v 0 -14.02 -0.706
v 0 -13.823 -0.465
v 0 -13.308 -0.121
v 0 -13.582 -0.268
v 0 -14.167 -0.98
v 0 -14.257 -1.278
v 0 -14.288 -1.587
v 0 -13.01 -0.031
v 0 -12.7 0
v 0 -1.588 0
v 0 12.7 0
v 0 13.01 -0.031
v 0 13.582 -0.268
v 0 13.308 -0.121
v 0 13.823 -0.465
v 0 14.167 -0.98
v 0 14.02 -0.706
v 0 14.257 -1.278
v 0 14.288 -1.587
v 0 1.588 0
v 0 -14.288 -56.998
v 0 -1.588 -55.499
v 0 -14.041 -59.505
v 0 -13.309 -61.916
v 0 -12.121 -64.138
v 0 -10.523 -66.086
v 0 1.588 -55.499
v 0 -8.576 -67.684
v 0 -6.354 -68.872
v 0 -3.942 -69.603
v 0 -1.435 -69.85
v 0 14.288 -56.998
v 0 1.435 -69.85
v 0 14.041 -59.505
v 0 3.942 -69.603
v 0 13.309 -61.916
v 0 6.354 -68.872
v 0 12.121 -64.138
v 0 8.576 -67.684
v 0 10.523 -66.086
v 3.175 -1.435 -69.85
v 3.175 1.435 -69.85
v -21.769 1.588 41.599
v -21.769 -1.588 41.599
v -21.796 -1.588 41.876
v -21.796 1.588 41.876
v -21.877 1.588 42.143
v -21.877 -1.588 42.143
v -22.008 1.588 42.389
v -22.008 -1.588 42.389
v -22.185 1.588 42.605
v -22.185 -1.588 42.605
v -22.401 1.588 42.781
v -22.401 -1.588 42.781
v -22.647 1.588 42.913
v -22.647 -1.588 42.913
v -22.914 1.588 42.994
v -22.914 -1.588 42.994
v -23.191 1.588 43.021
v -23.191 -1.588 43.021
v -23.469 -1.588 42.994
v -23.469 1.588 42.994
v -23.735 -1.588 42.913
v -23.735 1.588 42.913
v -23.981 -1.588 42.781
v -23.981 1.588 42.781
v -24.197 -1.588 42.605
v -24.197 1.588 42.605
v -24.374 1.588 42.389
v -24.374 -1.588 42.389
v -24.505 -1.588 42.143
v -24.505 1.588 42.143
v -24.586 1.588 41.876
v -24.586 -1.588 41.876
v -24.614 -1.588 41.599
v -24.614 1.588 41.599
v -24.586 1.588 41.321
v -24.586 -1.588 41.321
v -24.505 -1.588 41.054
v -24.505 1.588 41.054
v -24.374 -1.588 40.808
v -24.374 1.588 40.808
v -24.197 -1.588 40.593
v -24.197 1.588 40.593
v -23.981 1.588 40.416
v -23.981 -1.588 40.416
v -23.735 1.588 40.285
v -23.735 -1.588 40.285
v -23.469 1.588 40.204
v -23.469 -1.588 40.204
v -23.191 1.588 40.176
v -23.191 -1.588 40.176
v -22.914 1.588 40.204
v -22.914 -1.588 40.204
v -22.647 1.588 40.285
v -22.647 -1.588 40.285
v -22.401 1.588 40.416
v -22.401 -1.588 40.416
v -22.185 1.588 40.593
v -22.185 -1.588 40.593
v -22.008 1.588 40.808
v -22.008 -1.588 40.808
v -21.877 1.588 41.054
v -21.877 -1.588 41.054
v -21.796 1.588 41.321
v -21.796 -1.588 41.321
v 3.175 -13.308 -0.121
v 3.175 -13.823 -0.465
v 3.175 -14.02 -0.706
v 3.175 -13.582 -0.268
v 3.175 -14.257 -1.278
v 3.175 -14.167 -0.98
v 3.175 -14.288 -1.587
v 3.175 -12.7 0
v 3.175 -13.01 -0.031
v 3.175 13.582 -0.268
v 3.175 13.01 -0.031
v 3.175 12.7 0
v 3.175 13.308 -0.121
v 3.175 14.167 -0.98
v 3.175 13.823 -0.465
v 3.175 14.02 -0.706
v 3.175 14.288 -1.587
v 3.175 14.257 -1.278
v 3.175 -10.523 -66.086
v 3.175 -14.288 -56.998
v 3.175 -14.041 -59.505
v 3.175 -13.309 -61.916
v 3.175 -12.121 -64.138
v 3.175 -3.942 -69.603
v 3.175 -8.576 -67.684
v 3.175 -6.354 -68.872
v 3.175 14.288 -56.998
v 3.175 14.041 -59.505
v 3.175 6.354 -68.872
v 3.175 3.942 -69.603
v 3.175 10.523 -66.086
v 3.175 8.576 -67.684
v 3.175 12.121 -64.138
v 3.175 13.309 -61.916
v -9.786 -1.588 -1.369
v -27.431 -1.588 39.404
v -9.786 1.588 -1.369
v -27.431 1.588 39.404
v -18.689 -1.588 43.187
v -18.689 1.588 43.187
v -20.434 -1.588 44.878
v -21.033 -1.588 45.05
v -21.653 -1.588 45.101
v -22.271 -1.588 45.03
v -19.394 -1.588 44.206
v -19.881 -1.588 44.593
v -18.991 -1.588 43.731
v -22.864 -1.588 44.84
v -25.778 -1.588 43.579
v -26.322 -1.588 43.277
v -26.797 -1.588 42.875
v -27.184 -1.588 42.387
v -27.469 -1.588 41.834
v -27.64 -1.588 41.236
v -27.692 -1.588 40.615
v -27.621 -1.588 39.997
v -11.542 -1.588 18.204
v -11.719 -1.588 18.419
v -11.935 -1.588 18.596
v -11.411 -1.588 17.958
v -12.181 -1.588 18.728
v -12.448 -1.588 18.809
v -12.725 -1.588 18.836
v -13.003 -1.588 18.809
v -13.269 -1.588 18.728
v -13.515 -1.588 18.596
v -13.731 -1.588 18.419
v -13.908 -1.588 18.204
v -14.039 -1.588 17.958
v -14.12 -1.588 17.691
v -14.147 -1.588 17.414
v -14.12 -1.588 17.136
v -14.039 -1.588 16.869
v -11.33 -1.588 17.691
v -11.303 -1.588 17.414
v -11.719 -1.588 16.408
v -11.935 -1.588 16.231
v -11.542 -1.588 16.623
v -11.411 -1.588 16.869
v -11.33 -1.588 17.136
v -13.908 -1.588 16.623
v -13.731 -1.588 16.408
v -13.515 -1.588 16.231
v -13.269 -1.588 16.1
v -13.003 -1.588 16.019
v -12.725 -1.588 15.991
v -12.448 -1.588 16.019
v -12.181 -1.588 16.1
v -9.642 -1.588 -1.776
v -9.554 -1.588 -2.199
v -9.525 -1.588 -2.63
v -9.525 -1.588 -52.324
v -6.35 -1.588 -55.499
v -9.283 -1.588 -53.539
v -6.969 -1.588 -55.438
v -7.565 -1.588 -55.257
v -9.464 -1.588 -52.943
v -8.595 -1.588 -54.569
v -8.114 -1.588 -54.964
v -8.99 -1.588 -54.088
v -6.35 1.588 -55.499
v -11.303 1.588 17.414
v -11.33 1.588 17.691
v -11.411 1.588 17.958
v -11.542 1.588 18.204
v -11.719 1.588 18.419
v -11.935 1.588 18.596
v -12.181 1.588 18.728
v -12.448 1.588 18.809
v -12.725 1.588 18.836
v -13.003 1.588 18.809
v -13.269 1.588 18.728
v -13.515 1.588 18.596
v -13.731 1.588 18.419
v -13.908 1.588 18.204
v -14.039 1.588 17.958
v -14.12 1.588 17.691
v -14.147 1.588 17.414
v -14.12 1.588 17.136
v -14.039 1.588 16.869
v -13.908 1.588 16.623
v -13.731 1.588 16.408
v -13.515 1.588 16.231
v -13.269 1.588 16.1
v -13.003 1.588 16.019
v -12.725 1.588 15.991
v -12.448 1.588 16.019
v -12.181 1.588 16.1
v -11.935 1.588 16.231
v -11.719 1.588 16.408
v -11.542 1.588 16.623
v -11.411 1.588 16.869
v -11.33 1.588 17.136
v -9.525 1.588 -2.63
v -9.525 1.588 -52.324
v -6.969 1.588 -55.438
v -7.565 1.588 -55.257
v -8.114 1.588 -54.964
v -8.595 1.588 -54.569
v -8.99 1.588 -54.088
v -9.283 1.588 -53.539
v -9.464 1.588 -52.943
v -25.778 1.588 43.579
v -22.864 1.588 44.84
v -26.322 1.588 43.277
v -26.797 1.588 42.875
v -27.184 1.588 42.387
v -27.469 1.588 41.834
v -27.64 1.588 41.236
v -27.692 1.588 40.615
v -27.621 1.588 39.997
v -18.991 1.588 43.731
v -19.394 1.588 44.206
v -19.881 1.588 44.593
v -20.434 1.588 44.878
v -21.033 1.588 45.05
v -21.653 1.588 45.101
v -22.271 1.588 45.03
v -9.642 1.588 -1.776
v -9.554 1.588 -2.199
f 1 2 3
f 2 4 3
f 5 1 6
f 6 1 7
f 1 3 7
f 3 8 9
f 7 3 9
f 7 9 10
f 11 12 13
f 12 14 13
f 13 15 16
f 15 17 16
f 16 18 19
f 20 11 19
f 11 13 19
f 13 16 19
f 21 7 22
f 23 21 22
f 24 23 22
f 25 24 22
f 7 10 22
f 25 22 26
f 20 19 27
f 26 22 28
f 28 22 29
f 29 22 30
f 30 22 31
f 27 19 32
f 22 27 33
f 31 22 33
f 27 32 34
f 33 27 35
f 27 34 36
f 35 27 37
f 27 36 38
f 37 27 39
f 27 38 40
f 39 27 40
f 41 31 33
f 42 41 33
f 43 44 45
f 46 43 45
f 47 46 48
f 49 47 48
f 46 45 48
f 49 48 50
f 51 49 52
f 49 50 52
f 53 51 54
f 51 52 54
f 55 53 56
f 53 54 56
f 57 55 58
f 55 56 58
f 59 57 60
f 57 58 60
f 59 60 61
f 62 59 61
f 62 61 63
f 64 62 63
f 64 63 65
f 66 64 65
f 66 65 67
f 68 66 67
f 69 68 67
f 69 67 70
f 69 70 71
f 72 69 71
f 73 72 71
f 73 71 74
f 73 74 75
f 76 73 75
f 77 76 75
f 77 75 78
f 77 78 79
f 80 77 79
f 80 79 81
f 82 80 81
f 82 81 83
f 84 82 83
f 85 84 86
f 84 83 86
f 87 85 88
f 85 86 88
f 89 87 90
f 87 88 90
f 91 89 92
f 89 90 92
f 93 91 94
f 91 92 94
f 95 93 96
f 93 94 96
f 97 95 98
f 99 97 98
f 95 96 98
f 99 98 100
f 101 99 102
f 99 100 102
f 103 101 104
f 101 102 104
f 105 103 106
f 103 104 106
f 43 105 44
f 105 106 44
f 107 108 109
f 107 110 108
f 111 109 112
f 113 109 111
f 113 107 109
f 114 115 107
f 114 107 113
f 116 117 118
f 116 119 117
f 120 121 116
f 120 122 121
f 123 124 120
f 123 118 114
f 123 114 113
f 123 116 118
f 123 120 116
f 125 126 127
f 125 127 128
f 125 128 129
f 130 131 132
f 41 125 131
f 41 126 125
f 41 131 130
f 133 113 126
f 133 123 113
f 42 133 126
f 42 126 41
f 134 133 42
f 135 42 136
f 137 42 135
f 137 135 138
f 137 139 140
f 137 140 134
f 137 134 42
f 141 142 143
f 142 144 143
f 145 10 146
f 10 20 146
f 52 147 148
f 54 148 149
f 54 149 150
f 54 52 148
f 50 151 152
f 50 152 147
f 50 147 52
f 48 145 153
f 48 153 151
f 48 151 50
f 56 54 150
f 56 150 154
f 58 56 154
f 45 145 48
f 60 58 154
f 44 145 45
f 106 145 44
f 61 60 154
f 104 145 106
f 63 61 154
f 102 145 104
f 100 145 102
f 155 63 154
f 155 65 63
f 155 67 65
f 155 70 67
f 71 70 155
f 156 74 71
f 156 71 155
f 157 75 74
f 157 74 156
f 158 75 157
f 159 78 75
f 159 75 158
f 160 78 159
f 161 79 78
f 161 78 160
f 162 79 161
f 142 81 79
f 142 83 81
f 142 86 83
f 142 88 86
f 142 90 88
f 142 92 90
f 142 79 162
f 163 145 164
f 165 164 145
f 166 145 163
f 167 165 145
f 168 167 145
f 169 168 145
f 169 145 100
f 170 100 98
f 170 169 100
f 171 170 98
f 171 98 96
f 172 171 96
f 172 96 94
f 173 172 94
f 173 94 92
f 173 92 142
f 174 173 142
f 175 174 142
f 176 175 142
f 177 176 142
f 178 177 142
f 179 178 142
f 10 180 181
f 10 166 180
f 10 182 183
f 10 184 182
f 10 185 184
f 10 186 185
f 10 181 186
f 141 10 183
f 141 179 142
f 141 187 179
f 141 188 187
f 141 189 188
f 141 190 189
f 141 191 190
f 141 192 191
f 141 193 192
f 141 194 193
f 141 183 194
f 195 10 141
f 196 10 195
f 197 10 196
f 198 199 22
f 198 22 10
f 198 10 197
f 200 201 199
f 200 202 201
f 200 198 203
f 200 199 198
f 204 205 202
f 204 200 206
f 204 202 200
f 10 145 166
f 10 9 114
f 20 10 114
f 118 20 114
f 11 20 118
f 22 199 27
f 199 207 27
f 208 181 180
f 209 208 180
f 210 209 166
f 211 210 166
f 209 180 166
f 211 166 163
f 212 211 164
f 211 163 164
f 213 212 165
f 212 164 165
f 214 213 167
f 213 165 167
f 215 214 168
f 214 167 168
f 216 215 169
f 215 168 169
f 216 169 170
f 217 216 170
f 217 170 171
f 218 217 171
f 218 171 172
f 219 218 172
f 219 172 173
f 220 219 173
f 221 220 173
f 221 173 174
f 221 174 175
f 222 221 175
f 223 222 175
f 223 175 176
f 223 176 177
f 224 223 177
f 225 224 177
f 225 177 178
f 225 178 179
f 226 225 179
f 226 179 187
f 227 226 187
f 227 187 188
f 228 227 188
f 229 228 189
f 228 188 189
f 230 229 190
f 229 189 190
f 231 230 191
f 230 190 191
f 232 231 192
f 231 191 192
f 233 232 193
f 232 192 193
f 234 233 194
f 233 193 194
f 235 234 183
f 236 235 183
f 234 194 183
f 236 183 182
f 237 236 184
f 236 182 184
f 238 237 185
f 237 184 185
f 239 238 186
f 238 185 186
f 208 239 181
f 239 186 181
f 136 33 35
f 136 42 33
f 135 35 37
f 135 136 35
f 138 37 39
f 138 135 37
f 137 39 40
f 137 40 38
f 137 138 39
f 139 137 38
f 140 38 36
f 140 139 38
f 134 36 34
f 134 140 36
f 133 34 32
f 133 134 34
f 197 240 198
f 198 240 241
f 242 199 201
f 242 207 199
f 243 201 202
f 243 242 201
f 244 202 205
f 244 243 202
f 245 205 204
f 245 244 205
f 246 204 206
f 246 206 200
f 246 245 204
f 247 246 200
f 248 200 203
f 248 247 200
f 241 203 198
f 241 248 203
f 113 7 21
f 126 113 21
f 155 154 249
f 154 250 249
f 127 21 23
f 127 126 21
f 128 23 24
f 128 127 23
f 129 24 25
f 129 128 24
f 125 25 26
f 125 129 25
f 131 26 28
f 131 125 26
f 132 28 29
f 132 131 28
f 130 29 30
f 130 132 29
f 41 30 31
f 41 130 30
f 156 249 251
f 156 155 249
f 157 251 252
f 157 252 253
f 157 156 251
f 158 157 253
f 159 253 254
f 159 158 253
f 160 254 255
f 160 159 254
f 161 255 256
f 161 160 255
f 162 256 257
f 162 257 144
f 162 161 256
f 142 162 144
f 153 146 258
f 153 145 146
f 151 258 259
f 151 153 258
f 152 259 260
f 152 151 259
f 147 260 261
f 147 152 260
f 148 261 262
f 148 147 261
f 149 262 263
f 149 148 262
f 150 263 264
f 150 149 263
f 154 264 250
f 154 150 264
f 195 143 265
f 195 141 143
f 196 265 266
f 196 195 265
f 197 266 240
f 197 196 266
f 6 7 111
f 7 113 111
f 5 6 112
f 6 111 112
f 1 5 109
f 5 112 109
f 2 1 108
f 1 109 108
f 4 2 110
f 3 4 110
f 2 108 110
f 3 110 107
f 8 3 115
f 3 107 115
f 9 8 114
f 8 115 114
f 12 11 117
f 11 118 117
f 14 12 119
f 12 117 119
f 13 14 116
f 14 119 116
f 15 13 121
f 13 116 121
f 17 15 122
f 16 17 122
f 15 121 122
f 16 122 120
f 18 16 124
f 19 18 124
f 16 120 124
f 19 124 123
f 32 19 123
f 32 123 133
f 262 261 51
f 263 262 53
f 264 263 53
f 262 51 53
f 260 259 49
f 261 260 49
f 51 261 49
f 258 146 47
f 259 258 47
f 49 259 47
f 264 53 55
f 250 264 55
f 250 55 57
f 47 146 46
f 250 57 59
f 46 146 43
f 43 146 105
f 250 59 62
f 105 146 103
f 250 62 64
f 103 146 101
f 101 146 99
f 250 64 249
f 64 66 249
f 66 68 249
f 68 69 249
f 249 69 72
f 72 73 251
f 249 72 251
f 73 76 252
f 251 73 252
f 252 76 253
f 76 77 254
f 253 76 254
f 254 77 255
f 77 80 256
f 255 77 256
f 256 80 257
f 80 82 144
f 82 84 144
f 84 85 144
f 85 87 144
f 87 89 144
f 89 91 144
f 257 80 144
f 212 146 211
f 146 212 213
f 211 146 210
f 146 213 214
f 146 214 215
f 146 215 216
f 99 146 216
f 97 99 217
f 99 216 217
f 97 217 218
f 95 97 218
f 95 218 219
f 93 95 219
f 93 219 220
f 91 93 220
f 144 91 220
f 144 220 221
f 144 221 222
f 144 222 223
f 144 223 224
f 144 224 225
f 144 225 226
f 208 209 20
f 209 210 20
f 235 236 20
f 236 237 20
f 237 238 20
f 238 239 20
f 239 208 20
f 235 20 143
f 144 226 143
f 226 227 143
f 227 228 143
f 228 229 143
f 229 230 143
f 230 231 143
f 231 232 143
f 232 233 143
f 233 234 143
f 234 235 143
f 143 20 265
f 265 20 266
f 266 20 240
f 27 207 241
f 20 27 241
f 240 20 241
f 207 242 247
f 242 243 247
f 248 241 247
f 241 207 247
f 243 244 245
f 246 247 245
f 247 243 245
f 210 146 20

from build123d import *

# Parameters (mm, degrees)
SKETCH1_W           = 69.85
SKETCH1_H           = 28.575
BOSS_EXTRUDE1_DEPTH = 3.175
FILLET1_R           = 12.8524
BOSS_EXTRUDE2_DEPTH = 1.5875
FILLET2_R           = 1.5875
FILLET3_R           = 3.175
HOLE1_D             = 2.8448
LPATTERN1_COUNT     = 2
LPATTERN1_PITCH     = 26.3525


with BuildPart() as part:
    # Sketch1 → Boss-Extrude1 (new body)
    with BuildSketch(Plane(origin=(0, 0, 0), x_dir=(0, 0, -1), z_dir=(1, 0, 0))):
        with Locations((34.925, 0)):
            Rectangle(SKETCH1_W, SKETCH1_H)
    extrude(amount=BOSS_EXTRUDE1_DEPTH)

    # Fillet1
    fillet1_edges = [part.edges().sort_by_distance(p)[0] for p in [
        (1.5875, 14.2875, -69.85),
        (1.5875, -14.2875, -69.85),
    ]]
    fillet(fillet1_edges, radius=FILLET1_R)

    # Sketch4 → Boss-Extrude2 (add, symmetric)
    with BuildSketch(Plane(origin=(0, 0, 0), x_dir=(1, 0, 0), z_dir=(0, 1, 0))):
        Polygon((0, 0), (-19.950179226, -46.101), (-28.691757819, -42.318087272), (-9.525, 1.972577598), (-9.525, 55.499), (0, 55.499), align=None)
    extrude(amount=BOSS_EXTRUDE2_DEPTH, both=True)

    # Fillet2
    fillet2_edges = [part.edges().sort_by_distance(p)[0] for p in [
        (1.5875, -14.2875, 0),
        (1.5875, 14.2875, 0),
    ]]
    fillet(fillet2_edges, radius=FILLET2_R)

    # Fillet3
    fillet3_edges = [part.edges().sort_by_distance(p)[0] for p in [
        (-9.525, 0, -55.499),
        (-9.525, 0, -1.972577598),
        (-19.950179226, 0, 46.101),
        (-28.691757819, 0, 42.318087272),
    ]]
    fillet(fillet3_edges, radius=FILLET3_R)

    # Hole1 (through all)
    with Locations(Plane(origin=(0, 1.5875, 0), x_dir=(-1, 0, 0), z_dir=(0, 1, 0))):
        with Locations((23.191138588, 41.598725496)):
            hole1 = Hole(HOLE1_D / 2)

    # LPattern1: Hole1 ×2
    with Locations(*[Vector(0.397156192, 0, -0.917751033) * (i * LPATTERN1_PITCH) for i in range(1, LPATTERN1_COUNT)]):
        add(hole1, mode=Mode.SUBTRACT)


solid = part.part
